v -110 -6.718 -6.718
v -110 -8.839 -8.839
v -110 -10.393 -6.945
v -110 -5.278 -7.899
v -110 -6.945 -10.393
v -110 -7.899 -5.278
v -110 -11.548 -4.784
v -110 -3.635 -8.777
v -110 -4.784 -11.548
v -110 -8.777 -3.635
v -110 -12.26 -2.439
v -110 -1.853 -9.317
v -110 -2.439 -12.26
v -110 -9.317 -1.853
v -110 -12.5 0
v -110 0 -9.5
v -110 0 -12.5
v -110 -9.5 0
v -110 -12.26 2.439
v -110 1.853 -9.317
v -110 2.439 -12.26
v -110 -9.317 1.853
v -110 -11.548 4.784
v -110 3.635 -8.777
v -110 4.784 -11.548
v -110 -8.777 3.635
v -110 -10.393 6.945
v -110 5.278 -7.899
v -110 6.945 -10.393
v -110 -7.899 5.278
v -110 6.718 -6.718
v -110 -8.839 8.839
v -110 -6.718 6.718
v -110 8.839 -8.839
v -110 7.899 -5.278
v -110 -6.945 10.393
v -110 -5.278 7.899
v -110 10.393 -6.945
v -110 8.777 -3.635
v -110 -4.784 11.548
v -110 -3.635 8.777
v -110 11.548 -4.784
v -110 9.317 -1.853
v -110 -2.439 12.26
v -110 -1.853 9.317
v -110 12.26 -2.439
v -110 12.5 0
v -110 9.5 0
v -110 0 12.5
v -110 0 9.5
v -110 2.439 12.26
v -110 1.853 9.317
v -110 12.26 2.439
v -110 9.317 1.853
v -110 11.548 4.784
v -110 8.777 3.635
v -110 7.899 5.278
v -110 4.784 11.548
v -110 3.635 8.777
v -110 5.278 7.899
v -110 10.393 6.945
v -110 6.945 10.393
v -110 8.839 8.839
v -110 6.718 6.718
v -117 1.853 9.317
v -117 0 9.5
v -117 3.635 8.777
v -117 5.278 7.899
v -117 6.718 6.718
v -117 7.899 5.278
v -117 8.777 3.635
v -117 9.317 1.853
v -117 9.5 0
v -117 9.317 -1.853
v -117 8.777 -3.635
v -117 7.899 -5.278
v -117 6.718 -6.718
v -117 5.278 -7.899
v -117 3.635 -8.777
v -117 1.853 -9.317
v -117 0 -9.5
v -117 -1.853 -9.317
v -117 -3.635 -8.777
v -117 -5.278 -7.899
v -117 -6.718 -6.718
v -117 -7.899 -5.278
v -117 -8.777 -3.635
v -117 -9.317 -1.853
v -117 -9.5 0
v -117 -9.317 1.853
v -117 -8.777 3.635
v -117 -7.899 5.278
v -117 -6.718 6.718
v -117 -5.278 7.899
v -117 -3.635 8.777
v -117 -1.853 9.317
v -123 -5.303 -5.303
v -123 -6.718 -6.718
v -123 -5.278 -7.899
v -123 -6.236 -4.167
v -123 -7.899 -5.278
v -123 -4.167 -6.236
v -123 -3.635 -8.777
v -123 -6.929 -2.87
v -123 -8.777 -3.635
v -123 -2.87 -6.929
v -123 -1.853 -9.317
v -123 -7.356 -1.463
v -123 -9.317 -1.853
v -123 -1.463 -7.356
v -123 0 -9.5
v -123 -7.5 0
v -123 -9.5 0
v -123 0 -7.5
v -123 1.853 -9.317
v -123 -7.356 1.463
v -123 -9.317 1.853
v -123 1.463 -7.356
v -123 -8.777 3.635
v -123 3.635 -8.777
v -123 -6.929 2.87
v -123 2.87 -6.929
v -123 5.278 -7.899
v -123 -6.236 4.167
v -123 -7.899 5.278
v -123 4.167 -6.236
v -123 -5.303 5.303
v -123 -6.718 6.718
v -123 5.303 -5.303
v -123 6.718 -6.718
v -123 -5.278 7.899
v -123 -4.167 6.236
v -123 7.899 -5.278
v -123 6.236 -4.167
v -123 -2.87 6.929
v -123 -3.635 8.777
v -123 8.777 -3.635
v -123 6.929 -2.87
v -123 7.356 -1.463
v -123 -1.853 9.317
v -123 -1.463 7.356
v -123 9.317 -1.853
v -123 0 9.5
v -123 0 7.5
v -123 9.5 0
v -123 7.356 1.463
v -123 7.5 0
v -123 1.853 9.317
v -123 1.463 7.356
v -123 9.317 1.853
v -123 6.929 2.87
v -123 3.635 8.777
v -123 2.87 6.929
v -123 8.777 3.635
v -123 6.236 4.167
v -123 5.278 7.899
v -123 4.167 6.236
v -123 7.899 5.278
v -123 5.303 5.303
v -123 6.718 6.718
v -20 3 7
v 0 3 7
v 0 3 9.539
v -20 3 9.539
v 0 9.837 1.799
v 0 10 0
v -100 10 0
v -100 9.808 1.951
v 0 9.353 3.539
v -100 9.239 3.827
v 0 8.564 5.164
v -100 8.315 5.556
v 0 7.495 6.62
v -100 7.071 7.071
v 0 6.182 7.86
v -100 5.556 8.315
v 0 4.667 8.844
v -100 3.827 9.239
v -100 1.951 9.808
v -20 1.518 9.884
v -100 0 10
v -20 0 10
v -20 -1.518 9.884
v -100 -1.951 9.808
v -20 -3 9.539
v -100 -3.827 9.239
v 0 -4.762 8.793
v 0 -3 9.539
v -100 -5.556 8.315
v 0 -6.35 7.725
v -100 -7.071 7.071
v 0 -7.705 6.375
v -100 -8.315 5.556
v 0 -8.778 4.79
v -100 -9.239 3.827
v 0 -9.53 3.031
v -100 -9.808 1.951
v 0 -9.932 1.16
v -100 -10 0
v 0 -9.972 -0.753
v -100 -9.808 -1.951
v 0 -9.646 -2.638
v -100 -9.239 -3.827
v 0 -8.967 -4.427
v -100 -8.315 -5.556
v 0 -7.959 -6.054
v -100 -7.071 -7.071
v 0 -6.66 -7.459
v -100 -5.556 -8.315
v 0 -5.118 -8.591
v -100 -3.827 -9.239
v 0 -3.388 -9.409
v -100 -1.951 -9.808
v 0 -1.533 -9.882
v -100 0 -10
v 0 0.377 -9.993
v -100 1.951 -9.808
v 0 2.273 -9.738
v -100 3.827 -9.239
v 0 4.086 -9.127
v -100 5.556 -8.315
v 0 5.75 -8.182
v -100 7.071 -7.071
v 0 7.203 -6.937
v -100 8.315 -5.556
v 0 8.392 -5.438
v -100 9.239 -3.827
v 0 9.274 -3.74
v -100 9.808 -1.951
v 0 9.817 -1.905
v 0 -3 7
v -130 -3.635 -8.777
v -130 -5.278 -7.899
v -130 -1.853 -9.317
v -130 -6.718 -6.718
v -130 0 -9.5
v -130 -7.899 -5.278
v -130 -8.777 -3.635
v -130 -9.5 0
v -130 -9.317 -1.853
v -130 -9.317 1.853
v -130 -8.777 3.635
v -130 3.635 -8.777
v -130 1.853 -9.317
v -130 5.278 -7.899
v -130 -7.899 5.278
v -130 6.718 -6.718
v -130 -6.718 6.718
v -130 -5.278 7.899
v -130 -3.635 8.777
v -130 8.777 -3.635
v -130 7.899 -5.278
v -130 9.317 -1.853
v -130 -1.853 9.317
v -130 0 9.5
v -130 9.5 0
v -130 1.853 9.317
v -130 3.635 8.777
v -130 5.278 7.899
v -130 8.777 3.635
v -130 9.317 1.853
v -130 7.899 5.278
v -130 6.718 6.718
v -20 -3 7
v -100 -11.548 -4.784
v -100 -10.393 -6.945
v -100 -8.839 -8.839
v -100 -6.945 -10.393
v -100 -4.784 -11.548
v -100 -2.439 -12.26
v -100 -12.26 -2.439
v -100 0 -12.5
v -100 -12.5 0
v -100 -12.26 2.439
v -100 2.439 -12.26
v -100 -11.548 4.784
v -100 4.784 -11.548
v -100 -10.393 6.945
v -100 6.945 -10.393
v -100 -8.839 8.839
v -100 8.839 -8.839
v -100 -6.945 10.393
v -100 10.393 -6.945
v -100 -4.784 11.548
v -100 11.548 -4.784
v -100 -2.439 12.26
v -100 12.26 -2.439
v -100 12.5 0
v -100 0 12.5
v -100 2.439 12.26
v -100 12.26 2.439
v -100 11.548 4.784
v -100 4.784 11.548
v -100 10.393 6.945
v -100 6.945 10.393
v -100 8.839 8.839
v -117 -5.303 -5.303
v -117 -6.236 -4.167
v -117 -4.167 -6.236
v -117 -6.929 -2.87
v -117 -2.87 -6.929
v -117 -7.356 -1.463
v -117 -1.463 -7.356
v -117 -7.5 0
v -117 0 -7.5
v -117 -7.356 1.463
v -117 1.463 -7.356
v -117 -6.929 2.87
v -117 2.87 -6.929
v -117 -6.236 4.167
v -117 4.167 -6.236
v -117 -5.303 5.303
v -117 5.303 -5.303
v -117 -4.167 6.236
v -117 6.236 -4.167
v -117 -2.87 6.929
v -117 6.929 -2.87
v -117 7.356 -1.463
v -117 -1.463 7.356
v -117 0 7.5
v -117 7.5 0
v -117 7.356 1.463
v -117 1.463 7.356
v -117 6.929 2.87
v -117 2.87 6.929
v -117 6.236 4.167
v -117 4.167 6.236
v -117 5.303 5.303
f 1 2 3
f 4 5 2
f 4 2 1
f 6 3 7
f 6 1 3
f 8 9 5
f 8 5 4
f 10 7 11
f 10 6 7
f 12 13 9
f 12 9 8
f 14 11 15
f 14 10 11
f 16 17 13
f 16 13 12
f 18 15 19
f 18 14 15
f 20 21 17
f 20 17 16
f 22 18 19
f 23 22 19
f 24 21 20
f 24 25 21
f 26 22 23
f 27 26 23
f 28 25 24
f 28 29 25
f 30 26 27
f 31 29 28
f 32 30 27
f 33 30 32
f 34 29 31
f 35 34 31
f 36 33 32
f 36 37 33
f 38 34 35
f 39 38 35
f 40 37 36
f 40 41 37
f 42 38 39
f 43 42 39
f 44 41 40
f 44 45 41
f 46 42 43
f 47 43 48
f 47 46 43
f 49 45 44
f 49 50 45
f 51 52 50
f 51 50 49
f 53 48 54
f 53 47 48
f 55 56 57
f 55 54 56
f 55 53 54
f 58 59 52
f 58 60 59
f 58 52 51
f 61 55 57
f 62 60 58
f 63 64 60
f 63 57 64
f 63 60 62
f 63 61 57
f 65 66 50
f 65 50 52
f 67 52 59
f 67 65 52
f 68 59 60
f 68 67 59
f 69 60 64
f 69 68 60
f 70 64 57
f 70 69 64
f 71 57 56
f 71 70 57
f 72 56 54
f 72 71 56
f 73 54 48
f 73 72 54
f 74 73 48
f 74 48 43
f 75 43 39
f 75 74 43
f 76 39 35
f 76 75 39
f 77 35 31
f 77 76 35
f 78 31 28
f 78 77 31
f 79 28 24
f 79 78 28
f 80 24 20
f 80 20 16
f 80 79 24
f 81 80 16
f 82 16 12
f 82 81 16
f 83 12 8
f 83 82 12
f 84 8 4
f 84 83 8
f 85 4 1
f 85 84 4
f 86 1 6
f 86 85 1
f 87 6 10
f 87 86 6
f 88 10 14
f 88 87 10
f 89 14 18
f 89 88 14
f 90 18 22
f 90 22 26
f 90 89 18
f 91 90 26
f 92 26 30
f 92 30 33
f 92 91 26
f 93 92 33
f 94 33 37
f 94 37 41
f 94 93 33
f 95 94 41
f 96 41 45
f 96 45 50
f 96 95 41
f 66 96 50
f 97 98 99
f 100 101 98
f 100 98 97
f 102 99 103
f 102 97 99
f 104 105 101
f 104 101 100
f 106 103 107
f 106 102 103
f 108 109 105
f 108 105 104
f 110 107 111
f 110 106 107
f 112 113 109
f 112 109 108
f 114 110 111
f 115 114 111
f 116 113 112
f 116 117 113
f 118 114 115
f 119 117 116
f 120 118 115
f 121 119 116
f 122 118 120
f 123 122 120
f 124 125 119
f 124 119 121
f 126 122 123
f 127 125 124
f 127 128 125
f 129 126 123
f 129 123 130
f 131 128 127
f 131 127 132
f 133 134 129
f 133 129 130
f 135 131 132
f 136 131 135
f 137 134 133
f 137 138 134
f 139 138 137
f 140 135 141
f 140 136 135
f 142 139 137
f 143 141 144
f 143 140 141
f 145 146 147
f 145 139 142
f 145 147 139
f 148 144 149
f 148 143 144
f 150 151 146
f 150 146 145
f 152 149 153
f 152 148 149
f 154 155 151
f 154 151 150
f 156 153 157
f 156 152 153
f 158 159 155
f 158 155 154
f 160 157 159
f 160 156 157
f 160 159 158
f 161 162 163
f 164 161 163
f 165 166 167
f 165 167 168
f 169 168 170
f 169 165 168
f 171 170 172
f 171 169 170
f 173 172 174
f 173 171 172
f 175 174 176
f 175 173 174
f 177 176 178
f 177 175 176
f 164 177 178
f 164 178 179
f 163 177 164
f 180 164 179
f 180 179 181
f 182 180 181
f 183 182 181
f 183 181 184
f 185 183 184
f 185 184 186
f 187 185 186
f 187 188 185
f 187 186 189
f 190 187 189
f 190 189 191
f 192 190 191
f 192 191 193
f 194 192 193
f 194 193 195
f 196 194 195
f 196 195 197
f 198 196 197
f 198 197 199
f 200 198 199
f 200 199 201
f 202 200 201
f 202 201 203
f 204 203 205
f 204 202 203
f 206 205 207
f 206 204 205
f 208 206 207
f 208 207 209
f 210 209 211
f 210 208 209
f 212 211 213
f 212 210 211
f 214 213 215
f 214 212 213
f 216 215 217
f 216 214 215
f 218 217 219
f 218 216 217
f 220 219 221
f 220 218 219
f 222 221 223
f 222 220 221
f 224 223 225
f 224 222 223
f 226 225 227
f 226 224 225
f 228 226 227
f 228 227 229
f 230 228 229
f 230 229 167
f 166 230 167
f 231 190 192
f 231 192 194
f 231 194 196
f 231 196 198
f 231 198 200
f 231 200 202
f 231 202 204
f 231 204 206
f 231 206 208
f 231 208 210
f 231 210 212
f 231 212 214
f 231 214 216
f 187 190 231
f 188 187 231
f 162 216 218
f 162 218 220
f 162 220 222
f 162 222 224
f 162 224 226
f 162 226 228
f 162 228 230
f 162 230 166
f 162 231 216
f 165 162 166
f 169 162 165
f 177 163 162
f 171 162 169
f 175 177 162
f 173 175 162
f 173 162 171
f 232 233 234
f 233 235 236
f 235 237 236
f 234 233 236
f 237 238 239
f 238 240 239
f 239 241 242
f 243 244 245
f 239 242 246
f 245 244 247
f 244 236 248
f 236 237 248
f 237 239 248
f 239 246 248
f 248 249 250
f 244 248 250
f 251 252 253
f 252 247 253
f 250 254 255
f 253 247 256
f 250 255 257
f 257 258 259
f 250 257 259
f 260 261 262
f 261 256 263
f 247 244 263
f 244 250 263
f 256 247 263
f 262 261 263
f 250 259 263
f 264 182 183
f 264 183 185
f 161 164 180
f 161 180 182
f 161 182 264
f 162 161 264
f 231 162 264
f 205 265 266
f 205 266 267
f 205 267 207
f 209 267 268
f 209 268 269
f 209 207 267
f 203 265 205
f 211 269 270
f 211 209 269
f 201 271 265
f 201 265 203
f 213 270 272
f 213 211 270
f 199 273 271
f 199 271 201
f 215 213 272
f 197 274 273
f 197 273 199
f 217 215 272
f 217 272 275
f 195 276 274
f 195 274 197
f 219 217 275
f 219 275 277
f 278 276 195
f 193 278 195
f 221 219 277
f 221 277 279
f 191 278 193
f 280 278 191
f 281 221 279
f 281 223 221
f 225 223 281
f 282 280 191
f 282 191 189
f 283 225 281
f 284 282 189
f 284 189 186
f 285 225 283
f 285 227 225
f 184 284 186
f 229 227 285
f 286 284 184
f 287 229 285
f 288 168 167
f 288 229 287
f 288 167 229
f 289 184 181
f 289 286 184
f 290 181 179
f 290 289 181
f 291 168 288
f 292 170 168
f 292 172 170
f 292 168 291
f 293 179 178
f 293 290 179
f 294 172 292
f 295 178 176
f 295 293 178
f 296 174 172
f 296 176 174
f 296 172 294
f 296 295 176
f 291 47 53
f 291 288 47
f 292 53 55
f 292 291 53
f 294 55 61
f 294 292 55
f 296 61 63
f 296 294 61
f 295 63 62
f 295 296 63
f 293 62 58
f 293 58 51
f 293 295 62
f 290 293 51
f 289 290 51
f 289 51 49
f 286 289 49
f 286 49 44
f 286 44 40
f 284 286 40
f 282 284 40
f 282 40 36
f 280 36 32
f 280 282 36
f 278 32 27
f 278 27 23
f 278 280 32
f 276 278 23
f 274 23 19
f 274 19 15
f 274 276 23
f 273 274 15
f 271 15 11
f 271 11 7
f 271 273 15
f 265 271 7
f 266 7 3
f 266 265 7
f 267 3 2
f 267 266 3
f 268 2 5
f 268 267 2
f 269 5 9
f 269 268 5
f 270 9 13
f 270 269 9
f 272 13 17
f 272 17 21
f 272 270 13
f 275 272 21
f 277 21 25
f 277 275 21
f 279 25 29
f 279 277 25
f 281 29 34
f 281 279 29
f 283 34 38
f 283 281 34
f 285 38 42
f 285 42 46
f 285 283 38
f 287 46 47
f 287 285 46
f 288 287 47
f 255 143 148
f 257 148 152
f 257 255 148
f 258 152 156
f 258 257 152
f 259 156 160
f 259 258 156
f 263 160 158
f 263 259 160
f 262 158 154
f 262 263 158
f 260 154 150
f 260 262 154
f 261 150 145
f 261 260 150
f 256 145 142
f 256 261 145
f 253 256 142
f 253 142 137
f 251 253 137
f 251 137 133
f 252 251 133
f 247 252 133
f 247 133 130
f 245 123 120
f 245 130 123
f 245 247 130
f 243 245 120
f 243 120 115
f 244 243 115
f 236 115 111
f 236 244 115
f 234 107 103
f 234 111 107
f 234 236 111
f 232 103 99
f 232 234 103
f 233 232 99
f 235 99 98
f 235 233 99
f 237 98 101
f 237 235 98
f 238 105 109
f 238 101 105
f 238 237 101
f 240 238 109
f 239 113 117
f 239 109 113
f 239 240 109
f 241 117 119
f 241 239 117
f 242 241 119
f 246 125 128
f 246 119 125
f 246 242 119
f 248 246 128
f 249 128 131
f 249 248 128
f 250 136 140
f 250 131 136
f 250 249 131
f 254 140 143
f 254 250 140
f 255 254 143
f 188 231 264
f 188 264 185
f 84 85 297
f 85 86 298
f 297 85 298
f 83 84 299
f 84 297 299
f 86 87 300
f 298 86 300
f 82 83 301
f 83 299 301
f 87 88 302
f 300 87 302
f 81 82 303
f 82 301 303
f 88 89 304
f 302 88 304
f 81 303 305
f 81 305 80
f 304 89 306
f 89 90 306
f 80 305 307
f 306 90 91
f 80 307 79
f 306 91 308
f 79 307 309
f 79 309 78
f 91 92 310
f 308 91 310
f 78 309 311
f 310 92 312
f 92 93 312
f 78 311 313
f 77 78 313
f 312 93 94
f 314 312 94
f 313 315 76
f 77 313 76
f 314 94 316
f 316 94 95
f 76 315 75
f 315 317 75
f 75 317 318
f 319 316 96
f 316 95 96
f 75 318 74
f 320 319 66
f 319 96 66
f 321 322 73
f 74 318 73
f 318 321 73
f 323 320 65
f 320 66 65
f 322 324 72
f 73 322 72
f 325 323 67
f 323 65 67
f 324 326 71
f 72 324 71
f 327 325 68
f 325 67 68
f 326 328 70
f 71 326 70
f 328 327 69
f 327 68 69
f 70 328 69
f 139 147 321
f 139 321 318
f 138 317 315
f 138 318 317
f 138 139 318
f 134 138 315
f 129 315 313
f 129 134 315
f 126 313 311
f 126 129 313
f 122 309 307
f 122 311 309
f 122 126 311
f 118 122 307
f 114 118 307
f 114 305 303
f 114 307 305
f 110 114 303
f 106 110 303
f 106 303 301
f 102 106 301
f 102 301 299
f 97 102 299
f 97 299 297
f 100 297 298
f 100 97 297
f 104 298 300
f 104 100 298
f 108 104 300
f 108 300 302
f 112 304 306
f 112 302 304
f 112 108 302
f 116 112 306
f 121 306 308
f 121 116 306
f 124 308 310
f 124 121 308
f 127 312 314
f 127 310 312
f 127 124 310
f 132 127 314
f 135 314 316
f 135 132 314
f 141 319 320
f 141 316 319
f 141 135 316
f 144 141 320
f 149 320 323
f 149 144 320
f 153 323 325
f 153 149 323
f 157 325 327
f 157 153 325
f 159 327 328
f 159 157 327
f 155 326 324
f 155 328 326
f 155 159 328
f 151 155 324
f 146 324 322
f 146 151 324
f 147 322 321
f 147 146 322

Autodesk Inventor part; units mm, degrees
ref_plane "XZ Plane" through (0, 0, 0) normal (0, 1, 0) x (-1, 0, 0)
ref_plane "XY Plane" through (0, 0, 0) normal (0, 0, 1) x (1, 0, 0)
sketch "Sketch1" plane through (0, 0, 0) normal (1, 0, 0) x (0, 1, 0)
  circle A0 centre (0, 0) radius 12.5
  circle A1 centre (0, 0) radius 10
  dimension "d0" = 25
  dimension "d1" = 20
extrude "Extrusion1" add sketch "Sketch1" against normal blind 130 contours A0 | A1
extrude "Extrusion2" cut sketch "Sketch1" against normal blind 100
ref_plane "Work Plane2" through (-123, 0, 0) normal (1, 0, 0) x (0, 1, 0)
sketch "Sketch4" plane through (-123, 0, 0) normal (1, 0, 0) x (0, 1, 0)
  circle A0 centre (0, 0) radius 7.5
  circle A1 centre (0, 0) radius 9.5
  dimension "d11" = 15
  dimension "d20" = 19
extrude "Extrusion4" cut sketch "Sketch4" along normal blind 6
sketch "Sketch5" plane through (0, 0, 0) normal (1, 0, 0) x (0, 0, -1)
  line L0 (-7, 3) -> (-9.5394, 3)
  line L1 (-7, 3) -> (-7, -3)
  line L2 (-7, -3) -> (-9.5394, -3)
  circle A0 centre (0, 0) radius 10 projected
  arc A1 (-9.5394, 3) -> (-9.5394, -3) centre (0, 0) ccw
  point P0 (-7, 0)
  dimension "d14" = 7
  dimension "d15" = 6
  dimension "d16" = 3
extrude "Extrusion5" cut sketch "Sketch5" against normal blind 20 contours L1 L2 A0 L0 picked at (-7.9828, -0.338)
sketch "Sketch6" plane through (-130, 0, 0) normal (-1, 0, 0) x (0, 0, 1)
  circle A0 centre (0, 0) radius 12.5 projected
  circle A1 centre (0, 0) radius 9.5
  dimension "d21" = 19
extrude "Extrusion6" cut sketch "Sketch6" against normal blind 20
properties part number "shaft" material "Stainless Steel, 440C"
